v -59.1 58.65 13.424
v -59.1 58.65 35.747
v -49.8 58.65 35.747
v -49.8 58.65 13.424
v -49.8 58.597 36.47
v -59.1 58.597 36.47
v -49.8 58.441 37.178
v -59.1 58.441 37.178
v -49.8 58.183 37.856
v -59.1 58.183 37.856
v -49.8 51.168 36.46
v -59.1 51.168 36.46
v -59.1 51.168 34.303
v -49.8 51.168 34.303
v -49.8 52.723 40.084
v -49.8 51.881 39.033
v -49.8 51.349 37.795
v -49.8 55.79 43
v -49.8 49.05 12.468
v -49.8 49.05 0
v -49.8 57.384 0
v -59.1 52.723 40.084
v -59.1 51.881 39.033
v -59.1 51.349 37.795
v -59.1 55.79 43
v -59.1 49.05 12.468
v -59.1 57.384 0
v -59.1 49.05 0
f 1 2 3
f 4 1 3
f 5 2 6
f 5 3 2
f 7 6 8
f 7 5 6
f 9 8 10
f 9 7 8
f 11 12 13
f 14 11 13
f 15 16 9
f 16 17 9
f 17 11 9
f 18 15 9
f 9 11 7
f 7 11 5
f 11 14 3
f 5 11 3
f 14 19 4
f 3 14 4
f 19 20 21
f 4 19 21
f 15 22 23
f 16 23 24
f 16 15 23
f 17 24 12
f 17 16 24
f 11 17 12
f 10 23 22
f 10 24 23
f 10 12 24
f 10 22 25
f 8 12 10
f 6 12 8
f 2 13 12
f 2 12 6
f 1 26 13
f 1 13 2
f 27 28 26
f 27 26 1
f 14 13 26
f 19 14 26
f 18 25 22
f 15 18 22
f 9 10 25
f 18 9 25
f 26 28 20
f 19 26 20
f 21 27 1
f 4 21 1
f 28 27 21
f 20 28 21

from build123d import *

# Parameters (mm, degrees)
F0_W     = 9.3000009656
F0_H     = 9.5999985933
F1_DEPTH = 43
F3_DEPTH = 9.3010009656
F4_R     = 5


with BuildPart() as f1:
    # F0 (on Top) → F1 (new body)
    with BuildSketch(Plane.XY):
        with Locations((-54.4500015676, 53.8500025868)):
            Rectangle(F0_W, F0_H)
    extrude(amount=F1_DEPTH)

    # F2 (on face) → F3 (cut, through all)
    with BuildSketch(Plane(origin=(-59.1000020504, 0, 0), x_dir=(0, -1, 0), z_dir=(-1, 0, 0))):
        Polygon((-49.0500032902, 43), (-55.7899177074, 43), (-51.1679239571, 38.6058986187), (-51.1679239571, 34.302663058), (-49.0500032902, 12.4677242711), align=None)
        Polygon((-58.6500018835, 36.8527285755), (-55.7899177074, 43), (-58.6500018835, 43), align=None)
        Polygon((-57.3837086558, 0), (-58.6500018835, 13.4239988402), (-58.6500018835, 0), align=None)
    extrude(amount=-F3_DEPTH, mode=Mode.SUBTRACT)

    # F4
    f4_edges = [f1.edges().sort_by_distance(p)[0] for p in [
        (-54.450002, 51.167924, 38.605899),
        (-54.450002, 58.650002, 36.852729),
    ]]
    fillet(f4_edges, radius=F4_R)


solid = f1.part
